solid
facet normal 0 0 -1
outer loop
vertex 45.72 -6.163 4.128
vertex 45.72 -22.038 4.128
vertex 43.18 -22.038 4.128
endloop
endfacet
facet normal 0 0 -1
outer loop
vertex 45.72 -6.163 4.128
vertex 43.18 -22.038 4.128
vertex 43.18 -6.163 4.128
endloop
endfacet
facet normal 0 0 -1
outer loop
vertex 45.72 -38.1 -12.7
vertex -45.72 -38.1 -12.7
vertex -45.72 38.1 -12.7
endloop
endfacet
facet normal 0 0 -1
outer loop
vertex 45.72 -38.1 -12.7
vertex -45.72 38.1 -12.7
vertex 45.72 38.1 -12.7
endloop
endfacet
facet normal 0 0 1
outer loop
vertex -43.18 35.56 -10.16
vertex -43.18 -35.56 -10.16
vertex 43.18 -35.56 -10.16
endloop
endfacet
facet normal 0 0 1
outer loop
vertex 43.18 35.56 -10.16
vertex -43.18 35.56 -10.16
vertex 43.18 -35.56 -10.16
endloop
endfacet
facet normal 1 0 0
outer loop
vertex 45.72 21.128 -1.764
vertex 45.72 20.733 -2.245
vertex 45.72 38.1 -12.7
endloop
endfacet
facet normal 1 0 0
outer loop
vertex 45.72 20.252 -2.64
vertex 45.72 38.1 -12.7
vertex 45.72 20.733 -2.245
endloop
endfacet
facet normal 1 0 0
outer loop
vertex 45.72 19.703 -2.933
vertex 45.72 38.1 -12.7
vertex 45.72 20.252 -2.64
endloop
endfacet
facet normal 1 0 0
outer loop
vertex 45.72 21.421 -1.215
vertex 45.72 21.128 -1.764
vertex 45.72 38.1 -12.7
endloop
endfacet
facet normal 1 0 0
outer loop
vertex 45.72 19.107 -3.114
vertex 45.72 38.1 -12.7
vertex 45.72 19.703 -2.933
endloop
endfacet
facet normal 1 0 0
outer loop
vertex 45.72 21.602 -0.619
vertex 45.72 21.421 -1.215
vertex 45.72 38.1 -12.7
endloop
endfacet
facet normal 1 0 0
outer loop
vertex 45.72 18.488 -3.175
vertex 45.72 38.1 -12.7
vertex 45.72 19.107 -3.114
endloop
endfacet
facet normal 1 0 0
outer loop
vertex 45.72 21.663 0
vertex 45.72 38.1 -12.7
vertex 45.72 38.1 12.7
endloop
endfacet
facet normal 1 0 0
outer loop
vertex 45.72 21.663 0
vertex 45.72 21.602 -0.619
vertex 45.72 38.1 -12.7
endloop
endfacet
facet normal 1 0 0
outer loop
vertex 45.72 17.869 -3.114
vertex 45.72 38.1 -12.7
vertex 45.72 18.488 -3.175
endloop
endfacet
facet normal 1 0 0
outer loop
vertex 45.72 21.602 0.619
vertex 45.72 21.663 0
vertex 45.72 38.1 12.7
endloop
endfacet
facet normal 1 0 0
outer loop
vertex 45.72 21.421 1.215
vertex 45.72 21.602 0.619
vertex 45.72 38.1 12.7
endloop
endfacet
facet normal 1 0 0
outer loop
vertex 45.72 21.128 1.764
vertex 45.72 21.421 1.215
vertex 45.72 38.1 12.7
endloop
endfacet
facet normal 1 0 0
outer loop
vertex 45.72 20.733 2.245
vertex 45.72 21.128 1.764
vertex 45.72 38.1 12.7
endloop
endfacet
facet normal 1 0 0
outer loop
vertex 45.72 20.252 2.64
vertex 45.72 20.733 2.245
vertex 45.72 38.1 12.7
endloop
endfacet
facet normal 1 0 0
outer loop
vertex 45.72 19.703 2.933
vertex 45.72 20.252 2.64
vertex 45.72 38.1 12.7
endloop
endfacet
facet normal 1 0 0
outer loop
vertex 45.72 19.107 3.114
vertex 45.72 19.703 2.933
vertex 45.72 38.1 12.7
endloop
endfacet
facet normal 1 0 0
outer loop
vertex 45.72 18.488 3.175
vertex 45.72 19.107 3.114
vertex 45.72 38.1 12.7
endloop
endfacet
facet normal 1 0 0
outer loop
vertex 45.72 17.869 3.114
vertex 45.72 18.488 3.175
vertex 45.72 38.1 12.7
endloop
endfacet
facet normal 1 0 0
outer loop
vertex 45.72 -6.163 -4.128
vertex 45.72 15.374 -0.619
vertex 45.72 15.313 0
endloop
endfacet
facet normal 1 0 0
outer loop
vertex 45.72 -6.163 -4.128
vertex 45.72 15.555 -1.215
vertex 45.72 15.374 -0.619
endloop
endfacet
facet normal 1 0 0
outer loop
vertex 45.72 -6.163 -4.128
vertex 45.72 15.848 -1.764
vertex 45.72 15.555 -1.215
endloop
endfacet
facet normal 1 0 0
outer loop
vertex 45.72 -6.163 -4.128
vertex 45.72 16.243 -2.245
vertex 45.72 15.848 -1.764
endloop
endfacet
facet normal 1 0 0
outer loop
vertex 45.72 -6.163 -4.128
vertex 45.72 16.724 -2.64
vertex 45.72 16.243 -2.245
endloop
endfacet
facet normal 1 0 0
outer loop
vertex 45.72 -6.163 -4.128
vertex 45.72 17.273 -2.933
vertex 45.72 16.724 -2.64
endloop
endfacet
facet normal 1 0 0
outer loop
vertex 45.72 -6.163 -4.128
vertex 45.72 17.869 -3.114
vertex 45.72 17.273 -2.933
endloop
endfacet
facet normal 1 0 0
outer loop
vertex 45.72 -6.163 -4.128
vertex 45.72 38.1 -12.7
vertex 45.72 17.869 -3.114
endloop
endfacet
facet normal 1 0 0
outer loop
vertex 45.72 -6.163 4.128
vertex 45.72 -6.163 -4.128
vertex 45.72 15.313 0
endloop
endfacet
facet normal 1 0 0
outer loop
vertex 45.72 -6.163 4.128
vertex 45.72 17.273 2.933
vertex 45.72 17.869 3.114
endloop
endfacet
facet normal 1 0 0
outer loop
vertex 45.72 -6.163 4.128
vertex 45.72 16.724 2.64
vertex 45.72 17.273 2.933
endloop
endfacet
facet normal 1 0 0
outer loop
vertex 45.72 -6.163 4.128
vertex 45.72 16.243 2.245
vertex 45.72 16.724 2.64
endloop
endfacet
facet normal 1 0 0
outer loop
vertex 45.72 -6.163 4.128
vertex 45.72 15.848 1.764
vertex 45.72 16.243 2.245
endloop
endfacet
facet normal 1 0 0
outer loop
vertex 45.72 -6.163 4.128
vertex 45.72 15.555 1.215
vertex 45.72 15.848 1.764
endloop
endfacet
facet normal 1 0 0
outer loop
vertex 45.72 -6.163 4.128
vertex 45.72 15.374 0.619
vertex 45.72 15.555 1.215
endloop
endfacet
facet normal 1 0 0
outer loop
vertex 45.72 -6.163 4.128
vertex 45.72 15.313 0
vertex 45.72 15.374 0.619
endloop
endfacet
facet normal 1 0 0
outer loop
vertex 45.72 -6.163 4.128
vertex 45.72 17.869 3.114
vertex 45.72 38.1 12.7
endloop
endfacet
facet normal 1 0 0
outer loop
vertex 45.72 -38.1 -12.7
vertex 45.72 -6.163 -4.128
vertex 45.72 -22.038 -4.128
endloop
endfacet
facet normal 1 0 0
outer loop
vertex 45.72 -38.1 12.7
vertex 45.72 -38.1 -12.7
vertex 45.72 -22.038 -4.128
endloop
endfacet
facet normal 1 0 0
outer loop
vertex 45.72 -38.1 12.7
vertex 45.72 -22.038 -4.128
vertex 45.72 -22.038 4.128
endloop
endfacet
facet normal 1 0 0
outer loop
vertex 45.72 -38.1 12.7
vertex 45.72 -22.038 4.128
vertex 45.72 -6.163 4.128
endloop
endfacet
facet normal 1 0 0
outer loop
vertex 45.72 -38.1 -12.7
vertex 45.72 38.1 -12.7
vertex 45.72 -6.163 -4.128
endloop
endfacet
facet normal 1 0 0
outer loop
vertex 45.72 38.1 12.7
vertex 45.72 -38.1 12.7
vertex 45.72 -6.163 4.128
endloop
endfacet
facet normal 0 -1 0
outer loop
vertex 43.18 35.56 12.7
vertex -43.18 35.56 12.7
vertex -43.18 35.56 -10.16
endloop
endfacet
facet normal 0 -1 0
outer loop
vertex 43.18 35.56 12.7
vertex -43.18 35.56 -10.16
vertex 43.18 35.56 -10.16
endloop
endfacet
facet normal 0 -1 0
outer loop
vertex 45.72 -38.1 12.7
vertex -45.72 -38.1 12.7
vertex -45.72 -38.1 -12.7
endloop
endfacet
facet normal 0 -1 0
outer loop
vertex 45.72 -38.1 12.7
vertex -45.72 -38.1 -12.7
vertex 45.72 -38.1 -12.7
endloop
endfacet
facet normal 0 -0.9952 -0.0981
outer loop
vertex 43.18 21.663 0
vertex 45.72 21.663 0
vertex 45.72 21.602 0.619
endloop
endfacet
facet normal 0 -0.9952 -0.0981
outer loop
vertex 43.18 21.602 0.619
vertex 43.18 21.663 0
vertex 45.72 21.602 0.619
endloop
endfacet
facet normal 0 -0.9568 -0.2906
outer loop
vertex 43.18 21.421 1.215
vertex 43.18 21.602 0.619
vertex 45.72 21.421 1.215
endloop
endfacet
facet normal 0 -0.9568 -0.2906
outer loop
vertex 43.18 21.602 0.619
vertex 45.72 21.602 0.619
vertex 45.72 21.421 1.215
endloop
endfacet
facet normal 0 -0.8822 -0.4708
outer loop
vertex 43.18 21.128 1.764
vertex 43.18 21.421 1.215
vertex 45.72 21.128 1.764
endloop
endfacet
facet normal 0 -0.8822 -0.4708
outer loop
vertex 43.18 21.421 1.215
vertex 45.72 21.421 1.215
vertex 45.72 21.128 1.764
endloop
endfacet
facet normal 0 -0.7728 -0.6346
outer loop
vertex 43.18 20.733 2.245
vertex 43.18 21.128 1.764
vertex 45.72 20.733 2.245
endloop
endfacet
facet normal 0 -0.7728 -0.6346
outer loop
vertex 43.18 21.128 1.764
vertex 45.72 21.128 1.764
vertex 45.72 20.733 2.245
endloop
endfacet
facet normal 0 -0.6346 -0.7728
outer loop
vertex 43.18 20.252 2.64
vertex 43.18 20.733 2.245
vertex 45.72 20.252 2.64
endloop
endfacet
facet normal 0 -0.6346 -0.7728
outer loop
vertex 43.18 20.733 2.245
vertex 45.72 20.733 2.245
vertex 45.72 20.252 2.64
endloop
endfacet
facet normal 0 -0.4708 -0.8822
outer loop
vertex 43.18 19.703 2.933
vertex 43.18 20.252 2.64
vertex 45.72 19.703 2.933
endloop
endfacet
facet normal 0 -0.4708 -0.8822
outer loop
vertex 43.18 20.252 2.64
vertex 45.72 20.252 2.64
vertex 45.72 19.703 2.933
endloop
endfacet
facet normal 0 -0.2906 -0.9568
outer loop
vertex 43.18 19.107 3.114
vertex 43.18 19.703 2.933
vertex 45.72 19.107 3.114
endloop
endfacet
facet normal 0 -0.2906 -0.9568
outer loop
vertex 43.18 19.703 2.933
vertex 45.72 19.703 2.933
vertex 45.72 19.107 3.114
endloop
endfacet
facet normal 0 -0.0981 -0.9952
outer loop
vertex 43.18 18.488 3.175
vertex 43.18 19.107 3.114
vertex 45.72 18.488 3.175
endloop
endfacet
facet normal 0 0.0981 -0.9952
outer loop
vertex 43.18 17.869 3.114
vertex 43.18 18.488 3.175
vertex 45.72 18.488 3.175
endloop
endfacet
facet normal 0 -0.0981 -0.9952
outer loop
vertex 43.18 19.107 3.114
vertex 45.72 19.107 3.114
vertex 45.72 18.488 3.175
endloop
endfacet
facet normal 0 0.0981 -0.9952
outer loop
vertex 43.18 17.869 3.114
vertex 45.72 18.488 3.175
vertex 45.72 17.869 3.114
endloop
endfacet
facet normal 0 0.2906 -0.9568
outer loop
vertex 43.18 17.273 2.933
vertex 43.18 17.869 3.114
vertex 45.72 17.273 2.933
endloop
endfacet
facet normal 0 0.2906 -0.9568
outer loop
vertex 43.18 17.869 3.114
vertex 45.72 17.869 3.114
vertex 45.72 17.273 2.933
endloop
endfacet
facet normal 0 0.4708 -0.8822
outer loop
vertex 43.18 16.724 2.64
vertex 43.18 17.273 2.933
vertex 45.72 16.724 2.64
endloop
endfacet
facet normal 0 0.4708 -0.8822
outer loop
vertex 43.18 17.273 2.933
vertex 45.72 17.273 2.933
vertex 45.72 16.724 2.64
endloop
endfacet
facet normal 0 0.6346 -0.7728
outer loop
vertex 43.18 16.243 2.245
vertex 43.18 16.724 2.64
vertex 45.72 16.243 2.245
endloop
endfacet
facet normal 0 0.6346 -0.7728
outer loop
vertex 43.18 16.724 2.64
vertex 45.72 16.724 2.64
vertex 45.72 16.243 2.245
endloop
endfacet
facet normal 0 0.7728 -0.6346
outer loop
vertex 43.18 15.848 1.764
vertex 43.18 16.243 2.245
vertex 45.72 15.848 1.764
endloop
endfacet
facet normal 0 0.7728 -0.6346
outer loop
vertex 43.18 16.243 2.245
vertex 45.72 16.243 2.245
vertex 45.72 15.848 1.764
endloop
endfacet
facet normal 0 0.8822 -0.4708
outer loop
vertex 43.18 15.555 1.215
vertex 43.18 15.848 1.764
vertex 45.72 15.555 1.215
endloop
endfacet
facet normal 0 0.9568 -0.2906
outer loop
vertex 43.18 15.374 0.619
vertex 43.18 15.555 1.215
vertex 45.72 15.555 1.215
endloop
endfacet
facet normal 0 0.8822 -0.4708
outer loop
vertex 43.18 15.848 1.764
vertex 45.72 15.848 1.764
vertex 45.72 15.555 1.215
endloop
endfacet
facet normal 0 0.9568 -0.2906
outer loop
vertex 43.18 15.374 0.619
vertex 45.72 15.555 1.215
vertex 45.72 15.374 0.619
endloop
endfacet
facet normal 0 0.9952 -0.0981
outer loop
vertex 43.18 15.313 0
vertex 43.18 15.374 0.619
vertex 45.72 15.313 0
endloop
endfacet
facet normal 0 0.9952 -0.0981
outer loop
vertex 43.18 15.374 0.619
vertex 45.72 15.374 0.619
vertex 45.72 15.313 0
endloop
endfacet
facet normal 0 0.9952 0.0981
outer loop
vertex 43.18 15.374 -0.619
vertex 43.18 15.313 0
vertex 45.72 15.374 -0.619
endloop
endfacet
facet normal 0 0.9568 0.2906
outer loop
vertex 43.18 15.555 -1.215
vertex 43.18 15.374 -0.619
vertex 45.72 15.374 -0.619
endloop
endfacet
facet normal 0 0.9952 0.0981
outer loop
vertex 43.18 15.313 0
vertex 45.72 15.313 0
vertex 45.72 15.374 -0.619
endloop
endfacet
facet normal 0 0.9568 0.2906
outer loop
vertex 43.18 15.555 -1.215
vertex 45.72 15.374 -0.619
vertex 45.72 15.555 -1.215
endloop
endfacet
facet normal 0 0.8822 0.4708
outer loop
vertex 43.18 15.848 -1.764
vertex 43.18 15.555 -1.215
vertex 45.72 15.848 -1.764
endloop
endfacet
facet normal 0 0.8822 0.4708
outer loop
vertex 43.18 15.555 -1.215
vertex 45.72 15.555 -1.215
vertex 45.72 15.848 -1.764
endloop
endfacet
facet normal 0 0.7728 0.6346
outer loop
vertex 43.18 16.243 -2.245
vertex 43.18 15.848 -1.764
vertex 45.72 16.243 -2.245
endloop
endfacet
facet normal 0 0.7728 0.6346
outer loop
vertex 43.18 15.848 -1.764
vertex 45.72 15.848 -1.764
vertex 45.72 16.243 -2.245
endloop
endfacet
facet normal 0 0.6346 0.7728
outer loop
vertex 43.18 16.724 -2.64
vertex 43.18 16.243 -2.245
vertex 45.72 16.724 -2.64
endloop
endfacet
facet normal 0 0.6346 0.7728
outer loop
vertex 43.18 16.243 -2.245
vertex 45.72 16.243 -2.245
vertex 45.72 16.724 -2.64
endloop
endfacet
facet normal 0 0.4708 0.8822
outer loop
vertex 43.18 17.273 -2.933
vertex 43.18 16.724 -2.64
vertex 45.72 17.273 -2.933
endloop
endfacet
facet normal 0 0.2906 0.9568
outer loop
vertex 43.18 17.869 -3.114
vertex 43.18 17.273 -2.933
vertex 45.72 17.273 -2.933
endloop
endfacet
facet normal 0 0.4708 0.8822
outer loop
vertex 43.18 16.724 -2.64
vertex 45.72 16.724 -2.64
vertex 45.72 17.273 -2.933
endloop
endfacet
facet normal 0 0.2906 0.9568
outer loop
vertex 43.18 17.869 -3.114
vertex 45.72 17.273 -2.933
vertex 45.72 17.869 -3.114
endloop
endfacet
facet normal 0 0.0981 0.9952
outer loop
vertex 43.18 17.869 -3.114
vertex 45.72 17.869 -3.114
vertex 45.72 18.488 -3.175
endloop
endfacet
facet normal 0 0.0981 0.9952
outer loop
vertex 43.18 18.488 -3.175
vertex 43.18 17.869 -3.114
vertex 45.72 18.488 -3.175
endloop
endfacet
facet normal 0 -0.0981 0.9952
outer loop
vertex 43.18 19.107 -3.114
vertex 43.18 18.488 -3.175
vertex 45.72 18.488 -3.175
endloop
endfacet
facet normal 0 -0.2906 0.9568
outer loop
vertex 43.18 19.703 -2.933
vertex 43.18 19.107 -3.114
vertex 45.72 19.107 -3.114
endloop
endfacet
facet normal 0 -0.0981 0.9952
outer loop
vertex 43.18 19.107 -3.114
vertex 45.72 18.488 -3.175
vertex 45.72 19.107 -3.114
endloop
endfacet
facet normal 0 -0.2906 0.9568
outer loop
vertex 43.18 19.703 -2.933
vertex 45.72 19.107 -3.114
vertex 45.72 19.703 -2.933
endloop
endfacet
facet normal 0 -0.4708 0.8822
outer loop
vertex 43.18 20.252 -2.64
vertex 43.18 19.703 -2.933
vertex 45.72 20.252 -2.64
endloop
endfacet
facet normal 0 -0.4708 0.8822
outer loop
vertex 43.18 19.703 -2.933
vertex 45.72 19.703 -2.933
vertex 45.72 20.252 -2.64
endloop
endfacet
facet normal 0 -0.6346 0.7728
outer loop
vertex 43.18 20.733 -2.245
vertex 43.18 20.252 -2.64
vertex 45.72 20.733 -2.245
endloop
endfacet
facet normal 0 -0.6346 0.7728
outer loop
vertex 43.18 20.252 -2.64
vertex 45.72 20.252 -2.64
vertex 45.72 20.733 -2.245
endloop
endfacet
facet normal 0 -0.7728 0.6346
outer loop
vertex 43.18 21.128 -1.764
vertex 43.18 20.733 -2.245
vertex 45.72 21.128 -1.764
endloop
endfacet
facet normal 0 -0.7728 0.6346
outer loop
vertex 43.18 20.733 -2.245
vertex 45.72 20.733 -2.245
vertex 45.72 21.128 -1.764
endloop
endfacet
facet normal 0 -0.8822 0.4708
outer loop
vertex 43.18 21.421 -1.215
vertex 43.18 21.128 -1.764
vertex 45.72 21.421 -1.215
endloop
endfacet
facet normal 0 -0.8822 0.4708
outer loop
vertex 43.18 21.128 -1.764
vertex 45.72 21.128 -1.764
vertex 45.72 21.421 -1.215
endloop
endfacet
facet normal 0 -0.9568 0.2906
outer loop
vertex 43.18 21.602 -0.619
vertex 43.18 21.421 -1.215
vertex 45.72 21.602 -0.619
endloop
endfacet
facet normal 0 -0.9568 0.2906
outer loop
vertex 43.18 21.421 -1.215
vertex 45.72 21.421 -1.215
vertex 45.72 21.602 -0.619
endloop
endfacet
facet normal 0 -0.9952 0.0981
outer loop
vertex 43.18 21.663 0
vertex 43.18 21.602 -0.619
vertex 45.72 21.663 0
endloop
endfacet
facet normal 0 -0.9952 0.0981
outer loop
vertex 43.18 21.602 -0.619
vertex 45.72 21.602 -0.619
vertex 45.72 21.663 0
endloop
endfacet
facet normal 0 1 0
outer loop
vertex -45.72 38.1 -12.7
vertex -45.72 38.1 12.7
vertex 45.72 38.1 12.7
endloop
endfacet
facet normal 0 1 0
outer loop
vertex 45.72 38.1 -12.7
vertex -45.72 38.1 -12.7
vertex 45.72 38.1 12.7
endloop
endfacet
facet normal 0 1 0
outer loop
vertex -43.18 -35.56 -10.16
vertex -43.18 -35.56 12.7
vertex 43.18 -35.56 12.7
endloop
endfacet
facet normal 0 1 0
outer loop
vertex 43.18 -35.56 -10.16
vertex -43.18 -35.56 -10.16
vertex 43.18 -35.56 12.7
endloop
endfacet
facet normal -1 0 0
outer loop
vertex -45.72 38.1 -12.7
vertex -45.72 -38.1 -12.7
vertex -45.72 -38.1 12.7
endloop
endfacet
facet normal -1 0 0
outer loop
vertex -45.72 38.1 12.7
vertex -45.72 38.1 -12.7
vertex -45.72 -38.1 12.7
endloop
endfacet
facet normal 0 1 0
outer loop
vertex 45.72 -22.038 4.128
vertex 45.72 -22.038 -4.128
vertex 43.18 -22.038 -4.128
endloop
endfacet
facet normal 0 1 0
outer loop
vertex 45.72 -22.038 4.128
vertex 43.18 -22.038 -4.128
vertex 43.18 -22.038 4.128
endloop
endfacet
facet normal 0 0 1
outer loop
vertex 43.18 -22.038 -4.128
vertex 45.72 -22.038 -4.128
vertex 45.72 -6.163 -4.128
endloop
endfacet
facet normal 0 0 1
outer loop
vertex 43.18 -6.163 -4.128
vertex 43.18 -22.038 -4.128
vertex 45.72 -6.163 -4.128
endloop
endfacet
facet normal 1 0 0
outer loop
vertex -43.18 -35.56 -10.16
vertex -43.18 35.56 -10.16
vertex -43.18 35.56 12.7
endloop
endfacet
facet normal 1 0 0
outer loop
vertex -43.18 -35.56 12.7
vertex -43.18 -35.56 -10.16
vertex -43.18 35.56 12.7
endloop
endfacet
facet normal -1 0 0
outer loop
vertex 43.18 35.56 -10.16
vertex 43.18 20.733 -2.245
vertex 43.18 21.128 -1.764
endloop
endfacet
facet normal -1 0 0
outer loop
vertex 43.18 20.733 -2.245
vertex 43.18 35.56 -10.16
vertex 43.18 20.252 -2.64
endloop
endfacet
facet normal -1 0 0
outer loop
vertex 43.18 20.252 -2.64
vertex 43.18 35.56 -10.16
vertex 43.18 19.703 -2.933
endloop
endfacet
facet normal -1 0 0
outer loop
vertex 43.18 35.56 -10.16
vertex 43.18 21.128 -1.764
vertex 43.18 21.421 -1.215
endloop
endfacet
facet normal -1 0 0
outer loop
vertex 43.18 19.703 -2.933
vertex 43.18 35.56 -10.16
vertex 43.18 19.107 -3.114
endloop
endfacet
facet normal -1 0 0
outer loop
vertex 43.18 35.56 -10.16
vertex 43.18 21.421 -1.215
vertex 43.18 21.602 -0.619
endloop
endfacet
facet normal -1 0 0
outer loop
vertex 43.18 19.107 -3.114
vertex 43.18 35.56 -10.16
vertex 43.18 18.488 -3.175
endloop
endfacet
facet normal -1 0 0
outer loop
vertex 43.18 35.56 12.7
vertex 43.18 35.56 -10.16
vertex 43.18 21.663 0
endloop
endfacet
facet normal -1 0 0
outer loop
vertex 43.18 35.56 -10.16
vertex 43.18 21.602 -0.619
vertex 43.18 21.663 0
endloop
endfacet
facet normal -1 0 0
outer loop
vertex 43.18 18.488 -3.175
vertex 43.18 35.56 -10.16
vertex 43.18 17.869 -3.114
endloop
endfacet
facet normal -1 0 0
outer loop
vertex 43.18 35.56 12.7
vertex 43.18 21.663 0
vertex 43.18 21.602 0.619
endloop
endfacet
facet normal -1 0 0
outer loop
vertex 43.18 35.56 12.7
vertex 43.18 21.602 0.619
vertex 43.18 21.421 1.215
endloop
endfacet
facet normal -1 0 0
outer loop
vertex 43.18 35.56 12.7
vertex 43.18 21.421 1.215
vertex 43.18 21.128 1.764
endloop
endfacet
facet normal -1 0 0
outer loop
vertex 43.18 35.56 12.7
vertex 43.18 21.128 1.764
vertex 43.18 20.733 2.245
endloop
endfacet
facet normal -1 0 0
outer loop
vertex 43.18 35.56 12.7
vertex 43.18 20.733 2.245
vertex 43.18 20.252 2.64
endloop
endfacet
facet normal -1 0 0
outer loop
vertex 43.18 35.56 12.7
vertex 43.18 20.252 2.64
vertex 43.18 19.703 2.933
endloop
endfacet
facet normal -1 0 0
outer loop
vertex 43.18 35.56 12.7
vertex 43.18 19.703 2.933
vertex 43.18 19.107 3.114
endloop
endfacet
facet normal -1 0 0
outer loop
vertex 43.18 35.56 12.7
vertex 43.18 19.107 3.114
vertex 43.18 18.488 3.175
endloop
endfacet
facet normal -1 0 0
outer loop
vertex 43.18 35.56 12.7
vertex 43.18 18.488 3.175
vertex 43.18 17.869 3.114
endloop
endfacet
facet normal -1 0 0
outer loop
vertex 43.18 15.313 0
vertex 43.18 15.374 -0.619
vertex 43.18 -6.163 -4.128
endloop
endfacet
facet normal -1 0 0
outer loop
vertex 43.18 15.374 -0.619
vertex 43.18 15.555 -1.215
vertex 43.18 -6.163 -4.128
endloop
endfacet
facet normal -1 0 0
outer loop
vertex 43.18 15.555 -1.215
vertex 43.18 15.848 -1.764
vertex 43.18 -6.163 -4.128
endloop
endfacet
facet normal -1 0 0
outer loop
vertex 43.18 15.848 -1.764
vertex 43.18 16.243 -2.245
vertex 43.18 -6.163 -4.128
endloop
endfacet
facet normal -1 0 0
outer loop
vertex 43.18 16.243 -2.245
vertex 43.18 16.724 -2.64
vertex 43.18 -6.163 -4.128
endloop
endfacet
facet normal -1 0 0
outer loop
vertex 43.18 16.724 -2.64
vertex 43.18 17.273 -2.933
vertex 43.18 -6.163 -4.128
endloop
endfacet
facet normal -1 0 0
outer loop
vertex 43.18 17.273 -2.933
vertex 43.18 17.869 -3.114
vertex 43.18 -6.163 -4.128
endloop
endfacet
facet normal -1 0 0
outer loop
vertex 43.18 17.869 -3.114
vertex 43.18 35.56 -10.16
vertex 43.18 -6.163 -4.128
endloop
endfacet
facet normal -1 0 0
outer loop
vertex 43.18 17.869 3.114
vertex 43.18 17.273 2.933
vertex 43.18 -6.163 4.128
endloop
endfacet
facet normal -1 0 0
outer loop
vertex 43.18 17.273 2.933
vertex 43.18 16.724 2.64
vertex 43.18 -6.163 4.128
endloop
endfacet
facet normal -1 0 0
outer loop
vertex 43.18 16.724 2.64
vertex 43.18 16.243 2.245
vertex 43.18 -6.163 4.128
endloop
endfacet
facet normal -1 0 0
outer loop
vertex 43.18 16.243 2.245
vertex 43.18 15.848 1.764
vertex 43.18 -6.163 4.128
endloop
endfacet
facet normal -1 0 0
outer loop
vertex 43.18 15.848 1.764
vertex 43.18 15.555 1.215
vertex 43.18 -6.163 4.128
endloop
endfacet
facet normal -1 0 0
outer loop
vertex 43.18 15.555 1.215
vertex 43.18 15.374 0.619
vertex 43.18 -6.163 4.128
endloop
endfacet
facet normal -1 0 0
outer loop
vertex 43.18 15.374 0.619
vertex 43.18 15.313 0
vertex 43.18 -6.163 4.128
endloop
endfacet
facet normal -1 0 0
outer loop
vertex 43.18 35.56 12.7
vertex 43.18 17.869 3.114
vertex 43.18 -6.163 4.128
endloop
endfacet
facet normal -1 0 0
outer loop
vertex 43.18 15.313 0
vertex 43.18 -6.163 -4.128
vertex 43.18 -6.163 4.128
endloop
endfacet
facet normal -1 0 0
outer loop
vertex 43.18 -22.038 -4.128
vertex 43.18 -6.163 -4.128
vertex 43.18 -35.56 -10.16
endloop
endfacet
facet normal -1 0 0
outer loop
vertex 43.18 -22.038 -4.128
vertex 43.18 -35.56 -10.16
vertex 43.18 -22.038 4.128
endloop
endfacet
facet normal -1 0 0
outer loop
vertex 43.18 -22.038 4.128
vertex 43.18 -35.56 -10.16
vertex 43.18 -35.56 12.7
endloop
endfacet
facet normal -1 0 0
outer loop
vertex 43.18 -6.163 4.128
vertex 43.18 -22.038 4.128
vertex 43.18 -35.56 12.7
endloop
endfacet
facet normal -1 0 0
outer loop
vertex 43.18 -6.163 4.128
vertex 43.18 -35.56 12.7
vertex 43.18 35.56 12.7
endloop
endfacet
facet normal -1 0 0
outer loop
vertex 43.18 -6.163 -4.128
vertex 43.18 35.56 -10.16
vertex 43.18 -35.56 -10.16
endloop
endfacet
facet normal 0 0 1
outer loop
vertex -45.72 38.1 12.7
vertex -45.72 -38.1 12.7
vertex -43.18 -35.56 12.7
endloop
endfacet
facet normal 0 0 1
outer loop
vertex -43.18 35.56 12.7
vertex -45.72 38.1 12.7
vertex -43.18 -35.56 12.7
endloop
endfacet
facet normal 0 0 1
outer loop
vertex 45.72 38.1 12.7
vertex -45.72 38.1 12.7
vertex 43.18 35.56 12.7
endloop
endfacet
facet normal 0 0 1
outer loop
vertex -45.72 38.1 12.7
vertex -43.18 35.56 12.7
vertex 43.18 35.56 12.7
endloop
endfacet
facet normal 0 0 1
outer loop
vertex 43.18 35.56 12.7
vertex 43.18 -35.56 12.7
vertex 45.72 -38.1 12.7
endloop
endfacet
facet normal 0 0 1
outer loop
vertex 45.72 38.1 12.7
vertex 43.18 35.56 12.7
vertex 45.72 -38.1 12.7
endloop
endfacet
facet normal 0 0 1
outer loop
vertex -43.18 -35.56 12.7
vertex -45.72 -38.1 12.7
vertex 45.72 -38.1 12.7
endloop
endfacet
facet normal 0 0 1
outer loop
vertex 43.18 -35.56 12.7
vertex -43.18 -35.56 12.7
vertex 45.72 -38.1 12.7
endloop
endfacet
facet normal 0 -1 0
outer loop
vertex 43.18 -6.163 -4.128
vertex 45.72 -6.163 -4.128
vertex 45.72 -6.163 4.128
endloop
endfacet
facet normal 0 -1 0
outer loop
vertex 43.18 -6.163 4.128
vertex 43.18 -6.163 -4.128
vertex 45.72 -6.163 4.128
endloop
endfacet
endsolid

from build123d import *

# Parameters (mm, degrees)
F0_W     = 91.44
F0_H     = 25.4
F1_DEPTH = 38.1
F2_T     = -2.54
F3_W     = 15.875
F3_H     = 8.255
F3_R     = 3.175
F4_DEPTH = 2.54


with BuildPart() as f1:
    # F0 (on Front) → F1 (new body, symmetric)
    with BuildSketch(Plane.XZ):
        Rectangle(F0_W, F0_H)
    extrude(amount=F1_DEPTH, both=True)

    # F2
    f2_openings = [f1.faces().sort_by_distance(p)[0] for p in [
        (0, 0, 12.7),
    ]]
    offset(amount=F2_T, openings=f2_openings)

    # F3 (on face) → F4 (cut, through all)
    with BuildSketch(Plane.YZ.offset(45.72)):
        with Locations((-14.100978, 0)):
            Rectangle(F3_W, F3_H)
        with Locations((18.487949, 0)):
            Circle(F3_R)
    extrude(amount=-F4_DEPTH, mode=Mode.SUBTRACT)


solid = f1.part
